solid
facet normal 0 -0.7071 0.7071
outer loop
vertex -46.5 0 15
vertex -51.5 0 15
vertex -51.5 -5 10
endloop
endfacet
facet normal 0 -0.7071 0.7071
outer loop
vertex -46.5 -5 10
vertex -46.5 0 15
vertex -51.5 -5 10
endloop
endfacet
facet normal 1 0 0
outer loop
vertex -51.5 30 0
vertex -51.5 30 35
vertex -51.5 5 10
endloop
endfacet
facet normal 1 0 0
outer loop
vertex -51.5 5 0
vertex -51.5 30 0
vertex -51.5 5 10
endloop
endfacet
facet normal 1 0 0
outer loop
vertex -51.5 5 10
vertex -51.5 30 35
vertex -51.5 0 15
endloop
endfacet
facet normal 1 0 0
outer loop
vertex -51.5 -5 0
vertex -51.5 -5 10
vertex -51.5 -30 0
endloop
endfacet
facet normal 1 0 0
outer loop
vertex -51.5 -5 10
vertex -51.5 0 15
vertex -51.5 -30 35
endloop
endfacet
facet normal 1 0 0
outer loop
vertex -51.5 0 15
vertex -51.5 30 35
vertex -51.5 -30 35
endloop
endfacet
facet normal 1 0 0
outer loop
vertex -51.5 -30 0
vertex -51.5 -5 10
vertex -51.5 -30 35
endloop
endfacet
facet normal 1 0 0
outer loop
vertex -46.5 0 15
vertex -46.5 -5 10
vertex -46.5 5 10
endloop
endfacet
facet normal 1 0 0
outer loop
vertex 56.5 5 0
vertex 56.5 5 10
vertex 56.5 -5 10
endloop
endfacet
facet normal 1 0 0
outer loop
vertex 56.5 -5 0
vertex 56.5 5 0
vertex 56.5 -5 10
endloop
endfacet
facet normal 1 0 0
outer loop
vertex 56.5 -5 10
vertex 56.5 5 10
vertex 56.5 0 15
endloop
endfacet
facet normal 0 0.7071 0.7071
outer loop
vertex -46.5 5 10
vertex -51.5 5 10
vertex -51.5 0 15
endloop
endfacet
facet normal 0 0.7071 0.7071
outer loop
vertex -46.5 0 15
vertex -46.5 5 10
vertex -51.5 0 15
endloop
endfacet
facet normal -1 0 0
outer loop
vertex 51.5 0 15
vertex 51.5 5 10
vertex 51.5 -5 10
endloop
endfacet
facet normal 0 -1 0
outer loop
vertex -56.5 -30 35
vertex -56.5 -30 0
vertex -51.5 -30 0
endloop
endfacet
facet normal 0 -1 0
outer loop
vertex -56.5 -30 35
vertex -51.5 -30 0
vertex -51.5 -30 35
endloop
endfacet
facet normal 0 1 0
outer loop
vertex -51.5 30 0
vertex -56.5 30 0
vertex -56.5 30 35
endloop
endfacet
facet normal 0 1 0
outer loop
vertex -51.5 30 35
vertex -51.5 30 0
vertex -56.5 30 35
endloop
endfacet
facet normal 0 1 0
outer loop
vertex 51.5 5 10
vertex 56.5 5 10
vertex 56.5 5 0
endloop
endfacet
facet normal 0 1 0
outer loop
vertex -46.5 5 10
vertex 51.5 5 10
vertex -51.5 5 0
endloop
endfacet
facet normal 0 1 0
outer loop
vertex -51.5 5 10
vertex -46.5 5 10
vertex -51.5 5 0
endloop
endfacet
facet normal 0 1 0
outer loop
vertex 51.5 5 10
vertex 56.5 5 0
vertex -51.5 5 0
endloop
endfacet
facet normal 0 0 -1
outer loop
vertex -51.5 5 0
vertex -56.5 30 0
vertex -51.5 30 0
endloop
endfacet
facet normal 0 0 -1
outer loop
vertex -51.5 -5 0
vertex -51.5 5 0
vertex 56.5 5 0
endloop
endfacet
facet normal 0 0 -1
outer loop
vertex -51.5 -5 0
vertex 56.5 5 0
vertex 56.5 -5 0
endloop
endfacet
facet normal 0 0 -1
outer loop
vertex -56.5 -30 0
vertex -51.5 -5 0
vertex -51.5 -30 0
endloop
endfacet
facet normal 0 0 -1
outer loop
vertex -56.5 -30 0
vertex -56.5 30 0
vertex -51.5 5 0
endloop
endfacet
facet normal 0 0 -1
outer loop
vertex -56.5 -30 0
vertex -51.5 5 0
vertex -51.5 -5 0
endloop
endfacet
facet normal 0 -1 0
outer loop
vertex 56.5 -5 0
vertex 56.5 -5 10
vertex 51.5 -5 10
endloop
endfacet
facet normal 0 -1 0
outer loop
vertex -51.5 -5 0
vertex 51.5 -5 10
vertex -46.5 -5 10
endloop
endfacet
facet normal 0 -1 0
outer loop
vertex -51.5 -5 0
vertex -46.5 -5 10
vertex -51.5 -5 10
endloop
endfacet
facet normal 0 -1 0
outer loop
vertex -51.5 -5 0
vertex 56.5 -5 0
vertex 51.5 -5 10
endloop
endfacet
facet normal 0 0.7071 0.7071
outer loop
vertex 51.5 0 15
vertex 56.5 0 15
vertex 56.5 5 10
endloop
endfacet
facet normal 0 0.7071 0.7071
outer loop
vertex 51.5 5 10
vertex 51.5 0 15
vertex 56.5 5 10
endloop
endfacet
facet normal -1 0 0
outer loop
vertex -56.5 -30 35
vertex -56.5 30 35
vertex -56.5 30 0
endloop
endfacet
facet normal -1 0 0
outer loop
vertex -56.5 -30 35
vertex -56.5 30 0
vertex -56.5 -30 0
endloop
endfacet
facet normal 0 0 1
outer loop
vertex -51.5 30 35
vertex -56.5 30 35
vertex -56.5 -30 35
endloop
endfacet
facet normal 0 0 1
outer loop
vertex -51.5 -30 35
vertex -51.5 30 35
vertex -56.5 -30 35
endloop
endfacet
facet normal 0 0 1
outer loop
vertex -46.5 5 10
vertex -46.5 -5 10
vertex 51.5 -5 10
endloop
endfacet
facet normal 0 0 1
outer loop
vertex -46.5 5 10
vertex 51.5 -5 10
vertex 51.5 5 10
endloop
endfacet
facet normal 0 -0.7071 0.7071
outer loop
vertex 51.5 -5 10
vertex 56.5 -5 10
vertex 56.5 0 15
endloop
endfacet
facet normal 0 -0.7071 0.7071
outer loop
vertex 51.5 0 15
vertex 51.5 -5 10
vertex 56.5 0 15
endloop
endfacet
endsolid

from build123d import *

# Parameters (mm, degrees)
SKETCH1_W           = 10
SKETCH1_H           = 113
BOSS_EXTRUDE1_DEPTH = 10
BOSS_EXTRUDE2_DEPTH = 5
SKETCH4_W           = 60
SKETCH4_H           = 35
BOSS_EXTRUDE3_DEPTH = 5
BOSS_EXTRUDE4_DEPTH = 5


with BuildPart() as part:
    # Sketch1 → Boss-Extrude1 (new body)
    with BuildSketch(Plane(origin=(0, 0, 0), x_dir=(0, 1, 0), z_dir=(0, 0, 1))):
        Rectangle(SKETCH1_W, SKETCH1_H)
    extrude(amount=BOSS_EXTRUDE1_DEPTH)

    # Sketch3 → Boss-Extrude2 (add)
    with BuildSketch(Plane.YZ.offset(56.5)):
        Polygon((-5, 10), (0, 15), (5, 10), align=None)
    extrude(amount=-BOSS_EXTRUDE2_DEPTH)

    # Sketch4 → Boss-Extrude3 (add)
    with BuildSketch(Plane(origin=(-56.5, 0, 0), x_dir=(0, -1, 0), z_dir=(-1, 0, 0))):
        with Locations((0, 17.5)):
            Rectangle(SKETCH4_W, SKETCH4_H)
    extrude(amount=-BOSS_EXTRUDE3_DEPTH)

    # Sketch5 → Boss-Extrude4 (add)
    with BuildSketch(Plane.YZ.offset(-51.5)):
        Polygon((5, 10), (0, 15), (-5, 10), align=None)
    extrude(amount=BOSS_EXTRUDE4_DEPTH)


solid = part.part
